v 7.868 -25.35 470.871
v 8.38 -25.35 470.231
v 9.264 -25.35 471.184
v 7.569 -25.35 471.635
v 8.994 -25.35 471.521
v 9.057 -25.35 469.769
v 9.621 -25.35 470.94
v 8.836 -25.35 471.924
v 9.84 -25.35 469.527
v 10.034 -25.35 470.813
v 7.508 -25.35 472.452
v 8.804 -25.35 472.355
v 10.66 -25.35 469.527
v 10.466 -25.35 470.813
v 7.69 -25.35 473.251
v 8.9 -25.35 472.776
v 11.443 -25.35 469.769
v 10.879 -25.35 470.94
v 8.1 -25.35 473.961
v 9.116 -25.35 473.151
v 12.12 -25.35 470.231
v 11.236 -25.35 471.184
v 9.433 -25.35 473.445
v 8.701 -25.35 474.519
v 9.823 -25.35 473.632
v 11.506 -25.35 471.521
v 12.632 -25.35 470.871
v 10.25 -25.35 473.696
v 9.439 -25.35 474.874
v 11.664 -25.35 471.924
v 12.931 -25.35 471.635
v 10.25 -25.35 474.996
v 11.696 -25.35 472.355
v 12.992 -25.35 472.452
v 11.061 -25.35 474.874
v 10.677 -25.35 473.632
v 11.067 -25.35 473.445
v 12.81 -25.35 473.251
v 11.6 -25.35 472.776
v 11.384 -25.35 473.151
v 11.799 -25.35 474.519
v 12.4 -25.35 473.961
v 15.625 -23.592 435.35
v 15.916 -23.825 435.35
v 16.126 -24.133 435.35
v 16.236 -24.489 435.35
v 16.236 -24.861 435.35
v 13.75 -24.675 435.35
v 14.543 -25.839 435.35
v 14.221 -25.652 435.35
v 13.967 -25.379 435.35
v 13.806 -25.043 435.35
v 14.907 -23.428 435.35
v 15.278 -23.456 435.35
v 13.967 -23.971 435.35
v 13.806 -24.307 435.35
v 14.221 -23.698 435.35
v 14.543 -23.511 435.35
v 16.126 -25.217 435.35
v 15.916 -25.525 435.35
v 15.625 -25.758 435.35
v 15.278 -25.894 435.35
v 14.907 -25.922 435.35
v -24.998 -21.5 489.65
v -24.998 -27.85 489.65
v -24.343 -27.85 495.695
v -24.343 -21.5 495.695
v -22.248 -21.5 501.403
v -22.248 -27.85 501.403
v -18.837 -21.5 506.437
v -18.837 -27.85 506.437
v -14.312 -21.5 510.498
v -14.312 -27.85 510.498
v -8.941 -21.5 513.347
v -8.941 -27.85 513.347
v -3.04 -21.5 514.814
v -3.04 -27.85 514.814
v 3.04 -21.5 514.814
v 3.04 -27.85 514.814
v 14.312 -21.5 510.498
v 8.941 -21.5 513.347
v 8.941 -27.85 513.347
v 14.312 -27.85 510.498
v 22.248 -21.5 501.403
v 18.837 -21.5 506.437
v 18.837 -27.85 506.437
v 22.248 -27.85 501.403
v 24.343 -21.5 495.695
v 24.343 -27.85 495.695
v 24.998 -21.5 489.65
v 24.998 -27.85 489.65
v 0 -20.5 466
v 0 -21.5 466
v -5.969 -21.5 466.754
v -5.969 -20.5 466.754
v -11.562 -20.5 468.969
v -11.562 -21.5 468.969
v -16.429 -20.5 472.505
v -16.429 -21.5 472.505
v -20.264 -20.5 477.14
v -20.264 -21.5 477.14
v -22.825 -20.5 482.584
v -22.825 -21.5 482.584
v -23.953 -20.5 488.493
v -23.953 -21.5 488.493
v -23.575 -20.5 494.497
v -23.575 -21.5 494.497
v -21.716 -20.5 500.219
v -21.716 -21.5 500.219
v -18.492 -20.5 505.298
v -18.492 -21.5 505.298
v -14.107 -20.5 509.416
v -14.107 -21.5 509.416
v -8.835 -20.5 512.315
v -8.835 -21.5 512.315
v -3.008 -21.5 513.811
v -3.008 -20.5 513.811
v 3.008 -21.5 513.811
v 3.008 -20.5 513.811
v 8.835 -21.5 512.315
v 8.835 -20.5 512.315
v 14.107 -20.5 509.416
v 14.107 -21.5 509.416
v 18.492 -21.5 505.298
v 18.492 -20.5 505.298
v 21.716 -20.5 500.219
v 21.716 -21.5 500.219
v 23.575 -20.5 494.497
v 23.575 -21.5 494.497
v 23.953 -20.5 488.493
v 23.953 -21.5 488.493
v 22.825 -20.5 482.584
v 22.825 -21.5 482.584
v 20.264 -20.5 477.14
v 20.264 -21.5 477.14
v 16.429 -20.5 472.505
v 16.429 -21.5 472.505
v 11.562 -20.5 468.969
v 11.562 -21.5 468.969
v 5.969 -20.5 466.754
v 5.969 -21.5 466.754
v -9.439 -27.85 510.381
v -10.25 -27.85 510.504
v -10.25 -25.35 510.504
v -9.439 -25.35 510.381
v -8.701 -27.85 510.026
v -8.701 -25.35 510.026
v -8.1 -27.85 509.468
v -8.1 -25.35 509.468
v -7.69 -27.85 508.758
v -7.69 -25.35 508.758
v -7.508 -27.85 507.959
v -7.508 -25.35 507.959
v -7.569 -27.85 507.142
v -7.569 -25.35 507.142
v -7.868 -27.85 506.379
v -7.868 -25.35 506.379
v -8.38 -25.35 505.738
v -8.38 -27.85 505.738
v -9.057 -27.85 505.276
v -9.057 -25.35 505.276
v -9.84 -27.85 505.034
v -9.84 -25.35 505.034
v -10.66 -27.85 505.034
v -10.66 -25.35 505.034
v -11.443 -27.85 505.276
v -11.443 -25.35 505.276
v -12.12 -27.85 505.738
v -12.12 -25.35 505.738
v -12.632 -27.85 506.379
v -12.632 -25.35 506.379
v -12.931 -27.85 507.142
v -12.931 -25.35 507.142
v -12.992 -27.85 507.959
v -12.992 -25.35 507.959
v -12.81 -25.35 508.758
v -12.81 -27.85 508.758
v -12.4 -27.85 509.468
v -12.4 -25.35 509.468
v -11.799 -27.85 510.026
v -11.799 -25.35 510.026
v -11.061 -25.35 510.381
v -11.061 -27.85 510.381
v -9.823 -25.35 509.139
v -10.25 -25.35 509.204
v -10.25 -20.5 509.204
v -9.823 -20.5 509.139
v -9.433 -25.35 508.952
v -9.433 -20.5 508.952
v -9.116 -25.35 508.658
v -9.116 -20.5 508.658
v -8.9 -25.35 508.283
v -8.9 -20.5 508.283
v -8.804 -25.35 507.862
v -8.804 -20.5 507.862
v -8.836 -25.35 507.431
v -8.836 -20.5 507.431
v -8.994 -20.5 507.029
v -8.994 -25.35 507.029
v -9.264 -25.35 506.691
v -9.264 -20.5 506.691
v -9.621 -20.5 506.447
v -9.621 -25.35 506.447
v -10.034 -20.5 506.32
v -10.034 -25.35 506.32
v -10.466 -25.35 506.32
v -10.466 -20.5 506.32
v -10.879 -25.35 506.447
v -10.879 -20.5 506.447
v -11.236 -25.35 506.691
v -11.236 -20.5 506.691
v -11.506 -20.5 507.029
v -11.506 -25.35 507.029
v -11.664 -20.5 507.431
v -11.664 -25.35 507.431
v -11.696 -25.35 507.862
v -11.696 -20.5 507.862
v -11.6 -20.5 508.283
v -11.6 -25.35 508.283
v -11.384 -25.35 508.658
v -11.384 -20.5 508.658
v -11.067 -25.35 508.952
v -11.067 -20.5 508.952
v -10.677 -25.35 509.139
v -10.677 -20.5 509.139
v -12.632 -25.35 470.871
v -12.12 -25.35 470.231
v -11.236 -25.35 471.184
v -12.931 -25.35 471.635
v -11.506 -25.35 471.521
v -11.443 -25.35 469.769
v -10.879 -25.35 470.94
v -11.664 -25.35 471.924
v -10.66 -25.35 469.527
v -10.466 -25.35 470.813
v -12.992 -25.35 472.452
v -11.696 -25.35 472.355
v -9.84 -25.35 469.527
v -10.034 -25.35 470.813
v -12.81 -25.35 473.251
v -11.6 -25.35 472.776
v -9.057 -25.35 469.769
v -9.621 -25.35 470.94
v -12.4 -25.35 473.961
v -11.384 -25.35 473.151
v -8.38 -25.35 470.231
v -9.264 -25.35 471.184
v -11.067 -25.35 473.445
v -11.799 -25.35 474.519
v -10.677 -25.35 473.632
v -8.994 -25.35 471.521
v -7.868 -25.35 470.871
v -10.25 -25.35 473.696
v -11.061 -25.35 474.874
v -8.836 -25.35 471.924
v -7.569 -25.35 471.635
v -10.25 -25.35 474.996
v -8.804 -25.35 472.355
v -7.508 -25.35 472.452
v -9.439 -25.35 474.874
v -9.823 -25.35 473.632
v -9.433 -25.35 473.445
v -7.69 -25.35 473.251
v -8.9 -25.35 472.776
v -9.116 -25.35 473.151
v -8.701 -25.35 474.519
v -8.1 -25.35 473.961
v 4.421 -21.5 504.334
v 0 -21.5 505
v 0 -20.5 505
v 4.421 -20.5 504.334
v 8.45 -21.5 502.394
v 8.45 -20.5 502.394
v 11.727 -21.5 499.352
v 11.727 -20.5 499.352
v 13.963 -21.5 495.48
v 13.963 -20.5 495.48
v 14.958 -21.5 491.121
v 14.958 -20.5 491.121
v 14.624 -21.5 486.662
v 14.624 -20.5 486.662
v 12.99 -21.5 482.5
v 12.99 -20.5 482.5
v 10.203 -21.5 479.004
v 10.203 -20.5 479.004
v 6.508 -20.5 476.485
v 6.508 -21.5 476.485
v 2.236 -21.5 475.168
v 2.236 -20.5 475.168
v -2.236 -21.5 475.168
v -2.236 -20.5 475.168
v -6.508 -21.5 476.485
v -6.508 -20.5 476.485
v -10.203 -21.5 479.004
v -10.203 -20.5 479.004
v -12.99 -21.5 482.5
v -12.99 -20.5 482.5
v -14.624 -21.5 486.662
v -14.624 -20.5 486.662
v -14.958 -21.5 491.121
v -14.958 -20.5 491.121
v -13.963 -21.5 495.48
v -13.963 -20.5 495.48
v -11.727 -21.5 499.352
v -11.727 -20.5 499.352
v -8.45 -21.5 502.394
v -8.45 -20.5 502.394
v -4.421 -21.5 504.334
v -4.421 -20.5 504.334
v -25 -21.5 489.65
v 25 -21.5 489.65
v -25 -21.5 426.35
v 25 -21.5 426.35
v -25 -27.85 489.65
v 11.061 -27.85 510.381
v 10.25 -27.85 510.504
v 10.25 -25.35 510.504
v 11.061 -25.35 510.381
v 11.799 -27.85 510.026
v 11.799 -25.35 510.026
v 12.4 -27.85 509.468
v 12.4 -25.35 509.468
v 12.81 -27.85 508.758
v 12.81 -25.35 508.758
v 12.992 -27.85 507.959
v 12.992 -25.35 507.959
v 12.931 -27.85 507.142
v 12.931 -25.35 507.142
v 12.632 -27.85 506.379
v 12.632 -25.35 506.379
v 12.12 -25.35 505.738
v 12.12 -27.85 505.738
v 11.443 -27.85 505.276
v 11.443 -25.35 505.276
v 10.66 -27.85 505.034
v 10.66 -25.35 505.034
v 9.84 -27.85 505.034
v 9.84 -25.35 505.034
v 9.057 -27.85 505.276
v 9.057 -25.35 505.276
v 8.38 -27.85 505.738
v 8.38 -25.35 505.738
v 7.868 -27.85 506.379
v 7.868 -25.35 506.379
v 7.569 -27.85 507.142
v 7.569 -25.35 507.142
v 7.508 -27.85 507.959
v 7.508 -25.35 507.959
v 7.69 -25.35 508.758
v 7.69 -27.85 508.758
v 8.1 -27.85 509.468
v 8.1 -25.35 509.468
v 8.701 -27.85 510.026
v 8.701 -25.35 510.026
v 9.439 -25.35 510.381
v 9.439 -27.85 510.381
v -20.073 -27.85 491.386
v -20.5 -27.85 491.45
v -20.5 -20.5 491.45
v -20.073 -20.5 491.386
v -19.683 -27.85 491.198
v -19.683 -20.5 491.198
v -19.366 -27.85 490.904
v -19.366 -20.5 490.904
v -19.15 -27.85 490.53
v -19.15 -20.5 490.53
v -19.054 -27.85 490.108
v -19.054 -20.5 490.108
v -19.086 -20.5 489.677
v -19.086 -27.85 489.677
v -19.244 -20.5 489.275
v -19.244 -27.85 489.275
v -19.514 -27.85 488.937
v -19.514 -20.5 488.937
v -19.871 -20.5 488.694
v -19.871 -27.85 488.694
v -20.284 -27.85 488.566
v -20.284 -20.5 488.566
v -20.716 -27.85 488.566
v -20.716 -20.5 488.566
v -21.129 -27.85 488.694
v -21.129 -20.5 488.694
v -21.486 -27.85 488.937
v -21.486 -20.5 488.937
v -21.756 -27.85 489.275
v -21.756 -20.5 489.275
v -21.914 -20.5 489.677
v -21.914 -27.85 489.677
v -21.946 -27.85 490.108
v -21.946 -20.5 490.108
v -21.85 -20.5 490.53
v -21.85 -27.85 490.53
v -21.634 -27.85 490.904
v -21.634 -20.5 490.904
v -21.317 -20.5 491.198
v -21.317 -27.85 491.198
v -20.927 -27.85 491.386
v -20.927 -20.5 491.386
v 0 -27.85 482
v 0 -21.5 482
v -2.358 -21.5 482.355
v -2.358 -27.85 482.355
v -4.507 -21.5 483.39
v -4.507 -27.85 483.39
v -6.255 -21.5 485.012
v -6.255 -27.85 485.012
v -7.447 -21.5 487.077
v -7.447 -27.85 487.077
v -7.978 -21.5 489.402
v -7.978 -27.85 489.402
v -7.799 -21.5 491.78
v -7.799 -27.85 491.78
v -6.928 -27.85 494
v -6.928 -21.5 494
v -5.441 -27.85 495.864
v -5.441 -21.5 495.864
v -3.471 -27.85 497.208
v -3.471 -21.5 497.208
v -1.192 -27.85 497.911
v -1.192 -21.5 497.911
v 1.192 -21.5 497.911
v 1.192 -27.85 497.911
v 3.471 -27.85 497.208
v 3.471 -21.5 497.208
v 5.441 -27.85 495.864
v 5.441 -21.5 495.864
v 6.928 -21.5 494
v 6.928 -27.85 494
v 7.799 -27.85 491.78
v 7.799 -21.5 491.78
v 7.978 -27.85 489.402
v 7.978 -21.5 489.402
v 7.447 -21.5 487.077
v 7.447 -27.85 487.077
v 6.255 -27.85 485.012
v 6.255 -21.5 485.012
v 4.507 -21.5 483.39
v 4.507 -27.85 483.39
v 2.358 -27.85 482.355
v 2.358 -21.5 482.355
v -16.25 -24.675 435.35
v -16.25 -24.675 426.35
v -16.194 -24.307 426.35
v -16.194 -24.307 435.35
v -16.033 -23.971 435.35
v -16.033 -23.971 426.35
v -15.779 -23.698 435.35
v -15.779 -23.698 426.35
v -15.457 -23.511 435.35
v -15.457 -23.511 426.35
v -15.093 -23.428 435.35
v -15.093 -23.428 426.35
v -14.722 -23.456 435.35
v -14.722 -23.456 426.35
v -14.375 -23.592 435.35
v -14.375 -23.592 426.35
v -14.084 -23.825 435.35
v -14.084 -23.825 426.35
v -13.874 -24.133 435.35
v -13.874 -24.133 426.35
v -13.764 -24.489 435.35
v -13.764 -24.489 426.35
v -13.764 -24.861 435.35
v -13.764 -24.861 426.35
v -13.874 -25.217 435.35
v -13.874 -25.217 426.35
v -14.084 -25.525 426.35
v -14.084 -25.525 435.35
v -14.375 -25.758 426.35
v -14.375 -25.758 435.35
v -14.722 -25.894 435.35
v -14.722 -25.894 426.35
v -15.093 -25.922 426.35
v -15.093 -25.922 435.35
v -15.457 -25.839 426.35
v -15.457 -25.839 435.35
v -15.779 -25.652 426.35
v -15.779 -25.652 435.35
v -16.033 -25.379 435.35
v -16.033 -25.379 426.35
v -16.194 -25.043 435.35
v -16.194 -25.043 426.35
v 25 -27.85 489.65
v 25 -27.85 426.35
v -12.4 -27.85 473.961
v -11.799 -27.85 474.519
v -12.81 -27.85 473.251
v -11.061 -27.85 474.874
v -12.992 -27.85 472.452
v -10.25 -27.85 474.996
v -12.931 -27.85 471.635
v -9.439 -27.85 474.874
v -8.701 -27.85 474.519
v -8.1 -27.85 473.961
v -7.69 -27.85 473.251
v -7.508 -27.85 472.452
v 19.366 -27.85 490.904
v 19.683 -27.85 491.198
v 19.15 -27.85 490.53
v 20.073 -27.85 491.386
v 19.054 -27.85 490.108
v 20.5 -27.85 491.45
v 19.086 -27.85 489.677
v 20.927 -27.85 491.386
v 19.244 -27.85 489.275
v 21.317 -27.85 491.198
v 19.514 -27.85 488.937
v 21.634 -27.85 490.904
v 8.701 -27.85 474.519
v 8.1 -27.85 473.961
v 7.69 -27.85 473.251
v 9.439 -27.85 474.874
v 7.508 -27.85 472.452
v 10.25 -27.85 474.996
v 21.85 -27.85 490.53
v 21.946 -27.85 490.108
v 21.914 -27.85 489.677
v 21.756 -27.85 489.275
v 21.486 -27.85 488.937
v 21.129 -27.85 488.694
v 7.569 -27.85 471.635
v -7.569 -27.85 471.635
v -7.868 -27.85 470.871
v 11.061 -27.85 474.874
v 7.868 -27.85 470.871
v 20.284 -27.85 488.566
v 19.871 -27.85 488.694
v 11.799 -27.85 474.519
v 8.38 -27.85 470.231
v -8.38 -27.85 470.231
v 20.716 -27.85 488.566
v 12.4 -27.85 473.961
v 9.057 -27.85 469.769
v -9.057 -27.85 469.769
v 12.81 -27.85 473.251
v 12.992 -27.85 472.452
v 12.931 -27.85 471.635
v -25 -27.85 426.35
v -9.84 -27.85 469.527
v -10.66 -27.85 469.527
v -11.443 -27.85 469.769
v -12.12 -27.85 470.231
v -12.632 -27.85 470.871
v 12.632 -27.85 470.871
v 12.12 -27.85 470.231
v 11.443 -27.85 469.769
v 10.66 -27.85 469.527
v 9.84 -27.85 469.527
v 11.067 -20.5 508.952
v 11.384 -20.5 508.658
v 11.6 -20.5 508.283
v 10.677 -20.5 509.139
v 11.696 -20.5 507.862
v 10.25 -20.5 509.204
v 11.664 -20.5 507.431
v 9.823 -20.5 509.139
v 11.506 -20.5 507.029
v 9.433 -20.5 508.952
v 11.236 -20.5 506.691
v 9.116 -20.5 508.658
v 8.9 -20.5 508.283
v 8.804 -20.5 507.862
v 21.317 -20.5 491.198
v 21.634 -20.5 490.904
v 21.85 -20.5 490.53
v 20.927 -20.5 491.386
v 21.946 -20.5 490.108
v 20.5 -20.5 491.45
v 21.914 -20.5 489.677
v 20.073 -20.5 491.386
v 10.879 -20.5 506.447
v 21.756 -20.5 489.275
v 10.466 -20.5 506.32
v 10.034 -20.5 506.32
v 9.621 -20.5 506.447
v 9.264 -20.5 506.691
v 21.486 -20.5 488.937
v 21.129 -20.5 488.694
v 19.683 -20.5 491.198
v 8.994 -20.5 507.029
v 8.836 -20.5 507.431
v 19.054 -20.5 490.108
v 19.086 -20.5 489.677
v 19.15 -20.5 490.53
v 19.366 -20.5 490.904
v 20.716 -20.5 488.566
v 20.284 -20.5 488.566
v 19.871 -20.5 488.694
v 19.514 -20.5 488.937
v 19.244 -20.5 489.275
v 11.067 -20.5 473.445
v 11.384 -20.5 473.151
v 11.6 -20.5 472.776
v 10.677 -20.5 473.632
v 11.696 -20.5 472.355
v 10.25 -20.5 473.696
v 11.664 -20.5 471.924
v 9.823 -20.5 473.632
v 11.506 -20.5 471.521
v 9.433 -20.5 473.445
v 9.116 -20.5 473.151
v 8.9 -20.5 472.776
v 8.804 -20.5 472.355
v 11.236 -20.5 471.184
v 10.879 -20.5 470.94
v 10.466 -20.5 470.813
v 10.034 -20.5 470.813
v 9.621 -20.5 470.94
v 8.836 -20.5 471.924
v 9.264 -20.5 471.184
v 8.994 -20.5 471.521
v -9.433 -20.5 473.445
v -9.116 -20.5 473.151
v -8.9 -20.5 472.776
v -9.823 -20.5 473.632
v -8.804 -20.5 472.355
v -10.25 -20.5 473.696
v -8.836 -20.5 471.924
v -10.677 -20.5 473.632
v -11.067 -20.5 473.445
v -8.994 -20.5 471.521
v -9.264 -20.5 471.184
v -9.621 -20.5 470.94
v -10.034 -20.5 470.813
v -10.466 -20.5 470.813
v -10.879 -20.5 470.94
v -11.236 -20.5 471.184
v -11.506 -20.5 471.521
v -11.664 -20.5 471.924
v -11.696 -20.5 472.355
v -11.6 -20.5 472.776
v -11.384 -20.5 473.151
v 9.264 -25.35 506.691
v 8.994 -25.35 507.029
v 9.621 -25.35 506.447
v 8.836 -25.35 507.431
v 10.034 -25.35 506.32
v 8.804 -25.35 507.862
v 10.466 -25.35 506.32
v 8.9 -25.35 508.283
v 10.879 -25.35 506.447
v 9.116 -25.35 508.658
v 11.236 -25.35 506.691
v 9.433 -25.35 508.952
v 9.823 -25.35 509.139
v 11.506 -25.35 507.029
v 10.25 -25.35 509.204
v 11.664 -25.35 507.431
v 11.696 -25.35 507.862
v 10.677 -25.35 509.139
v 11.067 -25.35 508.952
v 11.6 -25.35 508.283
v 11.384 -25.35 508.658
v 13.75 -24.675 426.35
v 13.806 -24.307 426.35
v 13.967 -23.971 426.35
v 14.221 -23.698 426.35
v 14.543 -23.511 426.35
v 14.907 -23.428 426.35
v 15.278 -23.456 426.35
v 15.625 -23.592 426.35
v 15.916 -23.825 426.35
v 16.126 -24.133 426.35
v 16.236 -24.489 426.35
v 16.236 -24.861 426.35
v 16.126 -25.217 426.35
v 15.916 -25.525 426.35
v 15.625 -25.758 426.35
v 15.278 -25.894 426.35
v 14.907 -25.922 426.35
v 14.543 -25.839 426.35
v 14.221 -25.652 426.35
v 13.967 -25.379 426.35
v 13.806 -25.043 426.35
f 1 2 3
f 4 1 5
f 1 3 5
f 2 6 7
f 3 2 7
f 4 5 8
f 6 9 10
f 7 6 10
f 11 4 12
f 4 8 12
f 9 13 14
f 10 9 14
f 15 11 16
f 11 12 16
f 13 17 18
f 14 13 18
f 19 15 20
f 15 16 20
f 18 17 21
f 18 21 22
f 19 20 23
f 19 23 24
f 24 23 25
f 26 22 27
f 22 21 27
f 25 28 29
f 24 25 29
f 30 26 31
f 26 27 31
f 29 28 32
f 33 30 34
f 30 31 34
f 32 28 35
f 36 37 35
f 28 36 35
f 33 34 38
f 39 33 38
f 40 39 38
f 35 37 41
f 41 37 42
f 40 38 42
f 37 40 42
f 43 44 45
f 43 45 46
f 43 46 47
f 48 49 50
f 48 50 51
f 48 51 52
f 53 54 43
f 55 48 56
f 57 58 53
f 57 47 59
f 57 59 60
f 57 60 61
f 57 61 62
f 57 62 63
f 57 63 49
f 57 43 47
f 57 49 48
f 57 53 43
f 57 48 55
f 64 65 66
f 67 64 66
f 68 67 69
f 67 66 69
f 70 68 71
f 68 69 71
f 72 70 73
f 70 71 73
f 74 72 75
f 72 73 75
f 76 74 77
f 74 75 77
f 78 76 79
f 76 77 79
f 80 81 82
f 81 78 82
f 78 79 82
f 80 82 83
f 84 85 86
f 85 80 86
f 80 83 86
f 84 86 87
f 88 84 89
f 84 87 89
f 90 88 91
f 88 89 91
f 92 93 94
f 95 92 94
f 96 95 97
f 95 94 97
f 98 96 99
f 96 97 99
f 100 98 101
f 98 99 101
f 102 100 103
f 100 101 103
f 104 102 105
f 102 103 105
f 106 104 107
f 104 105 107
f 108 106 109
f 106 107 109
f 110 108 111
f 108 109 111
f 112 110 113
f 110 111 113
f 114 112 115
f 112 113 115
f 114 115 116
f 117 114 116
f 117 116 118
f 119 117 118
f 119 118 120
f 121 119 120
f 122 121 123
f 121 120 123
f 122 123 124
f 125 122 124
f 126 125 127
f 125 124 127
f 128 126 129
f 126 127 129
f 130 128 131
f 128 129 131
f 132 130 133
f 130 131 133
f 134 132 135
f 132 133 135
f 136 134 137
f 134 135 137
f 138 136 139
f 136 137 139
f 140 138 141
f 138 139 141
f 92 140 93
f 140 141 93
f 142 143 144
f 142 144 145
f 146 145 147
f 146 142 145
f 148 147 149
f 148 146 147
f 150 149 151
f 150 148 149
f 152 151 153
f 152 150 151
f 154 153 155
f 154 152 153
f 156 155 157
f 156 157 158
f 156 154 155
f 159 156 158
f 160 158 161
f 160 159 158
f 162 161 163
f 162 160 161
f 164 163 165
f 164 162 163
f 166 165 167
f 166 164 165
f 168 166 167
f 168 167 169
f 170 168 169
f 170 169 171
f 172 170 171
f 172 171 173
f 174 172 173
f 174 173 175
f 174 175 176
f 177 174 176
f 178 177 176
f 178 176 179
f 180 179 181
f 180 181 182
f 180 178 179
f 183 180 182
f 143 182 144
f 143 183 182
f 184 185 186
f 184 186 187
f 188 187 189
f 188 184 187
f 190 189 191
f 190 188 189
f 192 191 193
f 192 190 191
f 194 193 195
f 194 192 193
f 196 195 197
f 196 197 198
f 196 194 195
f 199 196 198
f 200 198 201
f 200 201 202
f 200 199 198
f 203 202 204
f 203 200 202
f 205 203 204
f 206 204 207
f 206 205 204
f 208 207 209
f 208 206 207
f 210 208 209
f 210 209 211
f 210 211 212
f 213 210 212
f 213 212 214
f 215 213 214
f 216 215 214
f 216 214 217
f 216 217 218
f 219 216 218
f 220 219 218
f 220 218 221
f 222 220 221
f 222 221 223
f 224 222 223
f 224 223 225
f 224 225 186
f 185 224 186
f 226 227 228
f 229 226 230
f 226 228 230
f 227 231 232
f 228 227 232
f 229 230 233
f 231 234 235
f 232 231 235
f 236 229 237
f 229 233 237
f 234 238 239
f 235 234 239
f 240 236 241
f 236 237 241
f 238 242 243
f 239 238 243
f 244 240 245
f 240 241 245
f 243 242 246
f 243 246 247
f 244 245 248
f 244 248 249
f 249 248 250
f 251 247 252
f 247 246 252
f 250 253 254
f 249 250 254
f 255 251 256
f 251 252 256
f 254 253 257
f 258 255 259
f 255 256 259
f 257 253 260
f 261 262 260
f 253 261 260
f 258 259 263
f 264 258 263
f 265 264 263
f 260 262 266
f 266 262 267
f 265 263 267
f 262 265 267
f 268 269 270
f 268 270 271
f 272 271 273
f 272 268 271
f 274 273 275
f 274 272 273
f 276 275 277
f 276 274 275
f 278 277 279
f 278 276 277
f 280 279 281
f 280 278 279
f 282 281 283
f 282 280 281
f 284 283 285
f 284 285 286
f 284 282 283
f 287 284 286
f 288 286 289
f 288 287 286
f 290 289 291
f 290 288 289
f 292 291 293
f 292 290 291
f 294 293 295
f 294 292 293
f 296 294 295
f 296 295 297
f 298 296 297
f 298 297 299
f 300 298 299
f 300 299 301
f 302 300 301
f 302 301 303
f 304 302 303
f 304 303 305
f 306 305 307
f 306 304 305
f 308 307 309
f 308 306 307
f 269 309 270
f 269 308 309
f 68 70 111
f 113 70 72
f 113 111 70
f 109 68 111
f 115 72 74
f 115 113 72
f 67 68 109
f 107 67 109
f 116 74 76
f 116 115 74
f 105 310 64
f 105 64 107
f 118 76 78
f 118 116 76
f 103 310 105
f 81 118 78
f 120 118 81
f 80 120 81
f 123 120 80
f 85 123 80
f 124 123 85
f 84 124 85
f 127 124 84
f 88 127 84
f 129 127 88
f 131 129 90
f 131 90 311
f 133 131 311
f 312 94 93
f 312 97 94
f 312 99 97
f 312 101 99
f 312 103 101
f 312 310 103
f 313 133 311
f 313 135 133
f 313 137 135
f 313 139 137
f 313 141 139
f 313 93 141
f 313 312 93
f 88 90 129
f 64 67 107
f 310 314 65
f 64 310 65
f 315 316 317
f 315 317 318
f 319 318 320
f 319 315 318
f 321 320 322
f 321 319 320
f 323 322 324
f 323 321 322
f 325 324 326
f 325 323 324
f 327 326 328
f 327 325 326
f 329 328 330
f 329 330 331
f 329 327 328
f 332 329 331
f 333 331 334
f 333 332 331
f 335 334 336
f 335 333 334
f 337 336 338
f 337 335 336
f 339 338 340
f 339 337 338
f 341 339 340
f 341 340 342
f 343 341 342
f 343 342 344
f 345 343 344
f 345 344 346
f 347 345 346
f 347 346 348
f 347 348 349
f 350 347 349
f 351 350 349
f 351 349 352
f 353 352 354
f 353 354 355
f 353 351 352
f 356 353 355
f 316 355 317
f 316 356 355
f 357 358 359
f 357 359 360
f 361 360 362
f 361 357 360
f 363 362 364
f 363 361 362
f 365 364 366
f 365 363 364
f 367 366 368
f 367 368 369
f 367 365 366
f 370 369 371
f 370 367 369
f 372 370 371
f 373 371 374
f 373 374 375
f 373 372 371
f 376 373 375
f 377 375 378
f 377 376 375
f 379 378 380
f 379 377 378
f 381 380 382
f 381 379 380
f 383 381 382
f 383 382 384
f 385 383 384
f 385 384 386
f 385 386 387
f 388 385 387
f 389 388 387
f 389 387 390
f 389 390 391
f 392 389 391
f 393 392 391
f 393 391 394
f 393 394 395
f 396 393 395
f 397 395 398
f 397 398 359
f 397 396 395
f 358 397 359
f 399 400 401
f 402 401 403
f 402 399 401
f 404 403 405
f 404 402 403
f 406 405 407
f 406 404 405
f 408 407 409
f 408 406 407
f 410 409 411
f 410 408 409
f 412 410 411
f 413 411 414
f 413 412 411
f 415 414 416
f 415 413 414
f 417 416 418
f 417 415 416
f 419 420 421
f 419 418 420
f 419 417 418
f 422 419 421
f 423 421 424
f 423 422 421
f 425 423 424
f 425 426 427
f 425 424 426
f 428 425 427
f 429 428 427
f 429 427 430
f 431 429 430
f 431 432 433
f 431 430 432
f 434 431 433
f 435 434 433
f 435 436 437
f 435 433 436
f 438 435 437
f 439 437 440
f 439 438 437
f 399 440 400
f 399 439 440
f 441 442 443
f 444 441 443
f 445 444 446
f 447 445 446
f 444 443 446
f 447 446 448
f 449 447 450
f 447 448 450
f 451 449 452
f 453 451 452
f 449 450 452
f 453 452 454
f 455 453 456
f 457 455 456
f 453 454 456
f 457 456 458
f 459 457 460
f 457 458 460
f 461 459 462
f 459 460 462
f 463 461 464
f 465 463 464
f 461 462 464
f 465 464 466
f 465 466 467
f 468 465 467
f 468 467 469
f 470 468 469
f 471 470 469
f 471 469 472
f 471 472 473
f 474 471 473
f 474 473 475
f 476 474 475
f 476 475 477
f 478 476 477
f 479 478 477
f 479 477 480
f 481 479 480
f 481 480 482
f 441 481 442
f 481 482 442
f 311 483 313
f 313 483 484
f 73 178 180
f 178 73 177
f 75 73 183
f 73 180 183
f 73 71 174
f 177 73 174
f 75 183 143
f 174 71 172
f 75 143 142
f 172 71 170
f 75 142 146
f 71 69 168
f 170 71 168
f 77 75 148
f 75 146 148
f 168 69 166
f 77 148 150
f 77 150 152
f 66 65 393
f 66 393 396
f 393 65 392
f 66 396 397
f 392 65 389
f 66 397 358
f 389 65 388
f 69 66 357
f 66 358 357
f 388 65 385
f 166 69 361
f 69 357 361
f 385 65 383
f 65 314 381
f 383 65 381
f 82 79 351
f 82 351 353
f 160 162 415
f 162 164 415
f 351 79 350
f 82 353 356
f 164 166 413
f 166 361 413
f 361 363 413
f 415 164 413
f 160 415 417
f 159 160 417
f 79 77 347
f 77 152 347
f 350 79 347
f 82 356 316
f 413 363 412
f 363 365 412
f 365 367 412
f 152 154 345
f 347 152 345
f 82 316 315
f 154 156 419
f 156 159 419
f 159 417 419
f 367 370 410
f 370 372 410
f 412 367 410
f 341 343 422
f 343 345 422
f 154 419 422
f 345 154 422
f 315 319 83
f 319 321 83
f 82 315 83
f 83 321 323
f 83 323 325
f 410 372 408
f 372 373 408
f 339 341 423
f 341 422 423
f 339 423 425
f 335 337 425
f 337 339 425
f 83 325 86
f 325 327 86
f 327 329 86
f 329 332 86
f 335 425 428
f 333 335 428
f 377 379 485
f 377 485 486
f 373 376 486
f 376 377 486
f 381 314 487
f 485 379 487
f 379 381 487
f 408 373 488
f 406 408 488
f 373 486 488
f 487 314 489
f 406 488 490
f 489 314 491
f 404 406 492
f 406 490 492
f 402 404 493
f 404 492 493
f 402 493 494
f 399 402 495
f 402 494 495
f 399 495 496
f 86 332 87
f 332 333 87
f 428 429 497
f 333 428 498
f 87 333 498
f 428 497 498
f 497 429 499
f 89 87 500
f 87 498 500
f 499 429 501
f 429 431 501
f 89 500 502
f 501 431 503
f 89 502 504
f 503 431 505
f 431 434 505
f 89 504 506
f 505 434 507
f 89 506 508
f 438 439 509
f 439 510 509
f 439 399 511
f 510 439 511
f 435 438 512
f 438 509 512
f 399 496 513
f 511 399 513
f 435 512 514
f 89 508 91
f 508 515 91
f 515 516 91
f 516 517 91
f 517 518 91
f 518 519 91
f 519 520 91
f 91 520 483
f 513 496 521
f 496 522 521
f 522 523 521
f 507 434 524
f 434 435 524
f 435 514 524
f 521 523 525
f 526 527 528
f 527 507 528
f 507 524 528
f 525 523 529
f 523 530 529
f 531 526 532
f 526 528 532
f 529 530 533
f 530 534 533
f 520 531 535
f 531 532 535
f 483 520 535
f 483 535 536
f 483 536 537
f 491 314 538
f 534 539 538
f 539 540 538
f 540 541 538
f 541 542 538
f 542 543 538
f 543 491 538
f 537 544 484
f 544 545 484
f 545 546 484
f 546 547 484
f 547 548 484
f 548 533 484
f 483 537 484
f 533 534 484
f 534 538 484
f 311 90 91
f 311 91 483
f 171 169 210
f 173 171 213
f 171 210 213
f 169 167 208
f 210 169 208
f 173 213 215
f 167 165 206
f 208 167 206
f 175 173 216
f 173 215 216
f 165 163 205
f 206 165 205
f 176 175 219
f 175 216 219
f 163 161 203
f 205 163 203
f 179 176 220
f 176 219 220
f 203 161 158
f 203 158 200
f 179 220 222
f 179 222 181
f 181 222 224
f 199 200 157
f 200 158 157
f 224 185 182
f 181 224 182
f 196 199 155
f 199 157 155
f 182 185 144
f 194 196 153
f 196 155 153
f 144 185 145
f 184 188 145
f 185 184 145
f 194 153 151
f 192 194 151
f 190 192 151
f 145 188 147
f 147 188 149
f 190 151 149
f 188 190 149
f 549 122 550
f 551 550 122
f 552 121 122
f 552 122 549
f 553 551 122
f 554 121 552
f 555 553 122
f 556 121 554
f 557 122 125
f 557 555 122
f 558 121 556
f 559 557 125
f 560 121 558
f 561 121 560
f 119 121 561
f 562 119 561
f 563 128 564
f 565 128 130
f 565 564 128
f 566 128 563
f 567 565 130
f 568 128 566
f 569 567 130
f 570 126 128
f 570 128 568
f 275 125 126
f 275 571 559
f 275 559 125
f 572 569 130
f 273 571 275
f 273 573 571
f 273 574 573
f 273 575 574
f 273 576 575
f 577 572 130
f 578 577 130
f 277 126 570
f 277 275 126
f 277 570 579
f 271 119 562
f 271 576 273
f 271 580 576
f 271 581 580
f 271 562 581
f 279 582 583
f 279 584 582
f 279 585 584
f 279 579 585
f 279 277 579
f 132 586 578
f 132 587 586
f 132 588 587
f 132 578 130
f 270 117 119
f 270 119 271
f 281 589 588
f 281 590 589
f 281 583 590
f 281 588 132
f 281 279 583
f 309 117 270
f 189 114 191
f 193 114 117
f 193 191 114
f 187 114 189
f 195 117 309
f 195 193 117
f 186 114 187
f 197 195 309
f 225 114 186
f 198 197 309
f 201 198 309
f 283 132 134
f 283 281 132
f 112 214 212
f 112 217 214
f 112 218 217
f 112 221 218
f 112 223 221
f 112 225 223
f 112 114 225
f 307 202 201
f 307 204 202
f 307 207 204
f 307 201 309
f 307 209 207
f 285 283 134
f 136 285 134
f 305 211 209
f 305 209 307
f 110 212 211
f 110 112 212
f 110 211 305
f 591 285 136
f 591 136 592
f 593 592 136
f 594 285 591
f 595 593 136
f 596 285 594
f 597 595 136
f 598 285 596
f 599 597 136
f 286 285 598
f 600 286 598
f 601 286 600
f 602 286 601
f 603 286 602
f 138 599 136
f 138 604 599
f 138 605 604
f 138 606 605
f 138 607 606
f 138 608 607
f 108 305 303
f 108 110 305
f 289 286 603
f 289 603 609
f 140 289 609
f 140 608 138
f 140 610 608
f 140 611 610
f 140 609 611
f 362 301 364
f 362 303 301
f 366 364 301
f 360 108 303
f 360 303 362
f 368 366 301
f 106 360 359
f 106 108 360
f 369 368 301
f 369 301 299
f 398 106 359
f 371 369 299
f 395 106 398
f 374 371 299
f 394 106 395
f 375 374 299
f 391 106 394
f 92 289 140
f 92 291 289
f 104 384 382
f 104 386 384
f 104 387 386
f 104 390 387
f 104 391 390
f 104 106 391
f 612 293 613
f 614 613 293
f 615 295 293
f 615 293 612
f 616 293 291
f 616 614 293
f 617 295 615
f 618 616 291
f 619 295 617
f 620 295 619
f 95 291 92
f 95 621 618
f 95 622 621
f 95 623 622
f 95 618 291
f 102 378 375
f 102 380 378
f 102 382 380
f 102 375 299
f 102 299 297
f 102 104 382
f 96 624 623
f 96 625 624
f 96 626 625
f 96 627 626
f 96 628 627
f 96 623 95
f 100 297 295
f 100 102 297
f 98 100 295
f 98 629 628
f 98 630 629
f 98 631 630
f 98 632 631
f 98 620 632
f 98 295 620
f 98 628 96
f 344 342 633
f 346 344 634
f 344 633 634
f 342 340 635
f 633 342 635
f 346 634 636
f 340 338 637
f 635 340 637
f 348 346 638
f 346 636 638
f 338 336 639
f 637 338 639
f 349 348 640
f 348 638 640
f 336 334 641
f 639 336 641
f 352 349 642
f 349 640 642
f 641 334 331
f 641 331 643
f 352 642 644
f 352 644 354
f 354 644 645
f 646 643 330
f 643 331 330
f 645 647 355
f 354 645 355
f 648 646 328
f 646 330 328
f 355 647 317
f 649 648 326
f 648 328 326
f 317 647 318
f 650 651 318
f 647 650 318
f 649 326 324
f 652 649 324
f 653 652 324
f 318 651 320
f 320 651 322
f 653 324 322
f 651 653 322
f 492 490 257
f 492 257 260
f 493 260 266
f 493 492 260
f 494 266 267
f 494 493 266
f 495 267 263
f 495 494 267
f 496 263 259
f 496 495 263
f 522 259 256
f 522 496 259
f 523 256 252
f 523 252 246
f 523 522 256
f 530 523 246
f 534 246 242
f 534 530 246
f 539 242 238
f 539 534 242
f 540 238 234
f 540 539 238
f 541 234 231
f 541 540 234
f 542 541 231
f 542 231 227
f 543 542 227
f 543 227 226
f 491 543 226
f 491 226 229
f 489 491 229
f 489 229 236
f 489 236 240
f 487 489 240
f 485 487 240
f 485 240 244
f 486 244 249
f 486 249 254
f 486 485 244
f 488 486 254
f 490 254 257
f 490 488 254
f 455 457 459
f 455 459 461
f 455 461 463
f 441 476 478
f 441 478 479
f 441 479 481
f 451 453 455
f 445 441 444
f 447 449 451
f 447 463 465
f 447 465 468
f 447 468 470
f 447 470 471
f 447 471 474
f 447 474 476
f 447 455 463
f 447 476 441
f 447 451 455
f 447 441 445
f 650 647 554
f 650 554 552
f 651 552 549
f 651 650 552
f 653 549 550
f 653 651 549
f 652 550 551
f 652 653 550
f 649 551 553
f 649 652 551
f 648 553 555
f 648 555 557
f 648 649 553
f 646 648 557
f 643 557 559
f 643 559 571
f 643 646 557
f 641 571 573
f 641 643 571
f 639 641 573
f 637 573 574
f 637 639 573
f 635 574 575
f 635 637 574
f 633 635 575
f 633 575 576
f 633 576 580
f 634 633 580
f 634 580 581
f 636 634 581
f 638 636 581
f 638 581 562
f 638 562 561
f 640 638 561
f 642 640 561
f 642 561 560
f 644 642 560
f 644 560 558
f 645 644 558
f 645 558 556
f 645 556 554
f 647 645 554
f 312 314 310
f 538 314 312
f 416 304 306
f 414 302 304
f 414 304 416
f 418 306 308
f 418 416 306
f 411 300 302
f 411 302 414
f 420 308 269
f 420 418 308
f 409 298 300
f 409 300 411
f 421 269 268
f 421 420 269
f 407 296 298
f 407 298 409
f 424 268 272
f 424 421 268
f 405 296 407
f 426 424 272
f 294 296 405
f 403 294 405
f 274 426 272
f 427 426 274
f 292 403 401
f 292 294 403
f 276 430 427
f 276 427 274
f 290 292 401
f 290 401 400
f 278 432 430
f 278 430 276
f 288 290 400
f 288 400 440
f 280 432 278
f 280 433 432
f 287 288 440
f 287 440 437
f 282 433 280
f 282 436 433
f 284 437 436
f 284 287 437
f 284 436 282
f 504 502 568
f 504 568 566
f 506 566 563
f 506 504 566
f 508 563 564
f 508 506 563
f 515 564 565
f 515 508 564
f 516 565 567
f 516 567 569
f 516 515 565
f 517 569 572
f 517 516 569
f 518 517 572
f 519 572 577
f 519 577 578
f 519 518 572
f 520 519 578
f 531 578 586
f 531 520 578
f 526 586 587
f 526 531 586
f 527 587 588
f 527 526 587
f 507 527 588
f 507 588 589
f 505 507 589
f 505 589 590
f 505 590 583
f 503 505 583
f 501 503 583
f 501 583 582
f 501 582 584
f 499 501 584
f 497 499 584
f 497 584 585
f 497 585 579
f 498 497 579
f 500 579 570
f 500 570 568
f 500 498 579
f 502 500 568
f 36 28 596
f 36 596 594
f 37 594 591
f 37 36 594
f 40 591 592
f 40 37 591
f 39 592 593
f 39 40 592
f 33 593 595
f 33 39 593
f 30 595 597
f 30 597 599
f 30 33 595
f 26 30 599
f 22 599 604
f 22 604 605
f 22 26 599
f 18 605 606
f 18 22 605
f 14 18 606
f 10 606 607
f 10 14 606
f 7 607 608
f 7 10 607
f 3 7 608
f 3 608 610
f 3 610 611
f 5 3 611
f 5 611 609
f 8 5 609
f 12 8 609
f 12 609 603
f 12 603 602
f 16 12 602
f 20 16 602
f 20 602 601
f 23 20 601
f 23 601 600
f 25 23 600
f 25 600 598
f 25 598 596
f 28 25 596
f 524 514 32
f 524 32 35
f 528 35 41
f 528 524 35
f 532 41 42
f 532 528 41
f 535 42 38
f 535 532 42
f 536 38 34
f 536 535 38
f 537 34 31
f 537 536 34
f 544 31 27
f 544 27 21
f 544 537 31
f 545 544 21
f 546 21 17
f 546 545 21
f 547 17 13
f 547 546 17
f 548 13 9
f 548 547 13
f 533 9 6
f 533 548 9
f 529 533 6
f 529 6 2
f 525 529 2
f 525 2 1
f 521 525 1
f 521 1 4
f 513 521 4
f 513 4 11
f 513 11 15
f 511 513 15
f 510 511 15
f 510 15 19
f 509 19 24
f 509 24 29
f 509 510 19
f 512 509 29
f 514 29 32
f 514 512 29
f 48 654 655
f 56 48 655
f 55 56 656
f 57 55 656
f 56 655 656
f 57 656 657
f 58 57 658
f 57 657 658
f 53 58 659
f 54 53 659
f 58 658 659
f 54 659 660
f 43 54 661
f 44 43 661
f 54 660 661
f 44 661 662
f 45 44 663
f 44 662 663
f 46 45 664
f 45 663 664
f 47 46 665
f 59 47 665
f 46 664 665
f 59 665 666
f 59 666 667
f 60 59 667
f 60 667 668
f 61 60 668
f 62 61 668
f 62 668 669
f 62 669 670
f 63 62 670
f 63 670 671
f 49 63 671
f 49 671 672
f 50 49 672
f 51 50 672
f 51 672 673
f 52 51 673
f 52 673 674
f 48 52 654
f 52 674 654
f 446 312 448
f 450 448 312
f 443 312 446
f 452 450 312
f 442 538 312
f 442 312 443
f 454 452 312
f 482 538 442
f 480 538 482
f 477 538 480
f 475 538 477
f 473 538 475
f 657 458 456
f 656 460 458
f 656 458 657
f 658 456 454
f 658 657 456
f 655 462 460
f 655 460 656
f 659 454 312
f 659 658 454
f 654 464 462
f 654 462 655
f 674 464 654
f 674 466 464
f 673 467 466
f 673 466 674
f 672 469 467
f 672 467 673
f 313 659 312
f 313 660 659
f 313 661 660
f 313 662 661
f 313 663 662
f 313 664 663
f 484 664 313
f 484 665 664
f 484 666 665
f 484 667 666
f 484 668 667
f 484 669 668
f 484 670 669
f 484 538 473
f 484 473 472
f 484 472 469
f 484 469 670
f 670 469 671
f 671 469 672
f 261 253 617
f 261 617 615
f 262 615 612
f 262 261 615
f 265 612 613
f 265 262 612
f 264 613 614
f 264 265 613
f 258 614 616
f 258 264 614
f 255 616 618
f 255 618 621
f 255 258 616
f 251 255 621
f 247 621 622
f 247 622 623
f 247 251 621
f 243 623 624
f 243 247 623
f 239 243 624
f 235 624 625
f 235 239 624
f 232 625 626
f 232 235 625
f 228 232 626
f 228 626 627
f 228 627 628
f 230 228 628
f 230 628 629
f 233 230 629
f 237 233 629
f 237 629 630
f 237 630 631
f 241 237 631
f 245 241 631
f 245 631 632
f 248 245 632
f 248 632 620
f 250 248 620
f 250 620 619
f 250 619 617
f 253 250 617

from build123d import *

# Parameters (mm, degrees)
PARED_START                    = -27.85
SK_PARED_W                     = 50
SK_PARED_H                     = 63.3
PARED_DEPTH                    = 6.35
CABEZA_START                   = -27.85
SK_CABEZA_R                    = 25
CABEZA_DEPTH                   = 6.35
ASIENTO_1MM_START              = -21.5
SK_ASIENTO_1MM_R               = 24
SK_ASIENTO_1MM_R_2             = 15
ASIENTO_1MM_DEPTH              = 1
PASO_CENTRAL_START             = -27.85
SK_PASO_CENTRAL_R              = 8
PASO_CENTRAL_DEPTH             = 7.35
PASANTES_M2_5_ESTATOR_J5_START = -27.85
SK_PASANTES_M2_5_ESTATOR_J5_R  = 1.45
PASANTES_M2_5_ESTATOR_J5_DEPTH = 7.35
CAJAS_M2_5_J5_START            = -27.85
SK_CAJAS_M2_5_J5_R             = 2.75
CAJAS_M2_5_J5_DEPTH            = 2.5
SK_ROSCA_M3_DESDE_ABAJO_R      = 1.25
ROSCA_M3_DESDE_ABAJO_DEPTH     = 9


with BuildPart() as part:
    # Sk_Pared → Pared (new body)
    with BuildSketch(Plane(origin=(0, 0, 0), x_dir=(1, 0, 0), z_dir=(0, 1, 0)).offset(PARED_START)):
        with Locations((0, -458)):
            Rectangle(SK_PARED_W, SK_PARED_H)
    extrude(amount=PARED_DEPTH)

    # Sk_Cabeza → Cabeza (add)
    with BuildSketch(Plane(origin=(0, 0, 0), x_dir=(1, 0, 0), z_dir=(0, 1, 0)).offset(CABEZA_START)):
        with Locations((0, -490)):
            Circle(SK_CABEZA_R)
    extrude(amount=CABEZA_DEPTH)

    # Sk_Asiento_1mm → Asiento_1mm (add)
    with BuildSketch(Plane(origin=(0, 0, 0), x_dir=(1, 0, 0), z_dir=(0, 1, 0)).offset(ASIENTO_1MM_START)):
        with Locations(Location((0, -490, 0), (0, 0, 90))):
            Circle(SK_ASIENTO_1MM_R)
        with Locations(Location((0, -490, 0), (0, 0, 270))):
            Circle(SK_ASIENTO_1MM_R_2, mode=Mode.SUBTRACT)
    extrude(amount=ASIENTO_1MM_DEPTH)

    # Sk_Paso_central → Paso_central (cut)
    with BuildSketch(Plane(origin=(0, 0, 0), x_dir=(1, 0, 0), z_dir=(0, 1, 0)).offset(PASO_CENTRAL_START)):
        with Locations(Location((0, -490, 0), (0, 0, 90))):
            Circle(SK_PASO_CENTRAL_R)
    extrude(amount=PASO_CENTRAL_DEPTH, mode=Mode.SUBTRACT)

    # Sk_Pasantes_M2-5_estator_J5 → Pasantes_M2-5_estator_J5 (cut)
    with BuildSketch(Plane(origin=(0, 0, 0), x_dir=(1, 0, 0), z_dir=(0, 1, 0)).offset(PASANTES_M2_5_ESTATOR_J5_START)):
        with Locations(Location((20.5, -490, 0), (0, 0, 270))):
            Circle(SK_PASANTES_M2_5_ESTATOR_J5_R)
        with Locations(Location((10.25, -507.753520778, 0), (0, 0, 270))):
            Circle(SK_PASANTES_M2_5_ESTATOR_J5_R)
        with Locations(Location((-10.25, -507.753520778, 0), (0, 0, 270))):
            Circle(SK_PASANTES_M2_5_ESTATOR_J5_R)
        with Locations(Location((-20.5, -490, 0), (0, 0, 270))):
            Circle(SK_PASANTES_M2_5_ESTATOR_J5_R)
        with Locations(Location((-10.25, -472.246479222, 0), (0, 0, 270))):
            Circle(SK_PASANTES_M2_5_ESTATOR_J5_R)
        with Locations(Location((10.25, -472.246479222, 0), (0, 0, 270))):
            Circle(SK_PASANTES_M2_5_ESTATOR_J5_R)
    extrude(amount=PASANTES_M2_5_ESTATOR_J5_DEPTH, mode=Mode.SUBTRACT)

    # Sk_Cajas_M2-5_J5 → Cajas_M2-5_J5 (cut)
    with BuildSketch(Plane(origin=(0, 0, 0), x_dir=(1, 0, 0), z_dir=(0, 1, 0)).offset(CAJAS_M2_5_J5_START)):
        with Locations(Location((10.25, -507.753520778, 0), (0, 0, 270))):
            Circle(SK_CAJAS_M2_5_J5_R)
        with Locations(Location((-10.25, -507.753520778, 0), (0, 0, 270))):
            Circle(SK_CAJAS_M2_5_J5_R)
        with Locations(Location((-10.25, -472.246479222, 0), (0, 0, 270))):
            Circle(SK_CAJAS_M2_5_J5_R)
        with Locations(Location((10.25, -472.246479222, 0), (0, 0, 270))):
            Circle(SK_CAJAS_M2_5_J5_R)
    extrude(amount=CAJAS_M2_5_J5_DEPTH, mode=Mode.SUBTRACT)

    # Sk_Rosca_M3_desde_abajo → Rosca_M3_desde_abajo (cut)
    with BuildSketch(Plane(origin=(0, 0, 426.35), x_dir=(-1, 0, 0), z_dir=(0, 0, -1))):
        with Locations((15, -24.675)):
            Circle(SK_ROSCA_M3_DESDE_ABAJO_R)
        with Locations((-15, -24.675)):
            Circle(SK_ROSCA_M3_DESDE_ABAJO_R)
    extrude(amount=-ROSCA_M3_DESDE_ABAJO_DEPTH, mode=Mode.SUBTRACT)


solid = part.part
